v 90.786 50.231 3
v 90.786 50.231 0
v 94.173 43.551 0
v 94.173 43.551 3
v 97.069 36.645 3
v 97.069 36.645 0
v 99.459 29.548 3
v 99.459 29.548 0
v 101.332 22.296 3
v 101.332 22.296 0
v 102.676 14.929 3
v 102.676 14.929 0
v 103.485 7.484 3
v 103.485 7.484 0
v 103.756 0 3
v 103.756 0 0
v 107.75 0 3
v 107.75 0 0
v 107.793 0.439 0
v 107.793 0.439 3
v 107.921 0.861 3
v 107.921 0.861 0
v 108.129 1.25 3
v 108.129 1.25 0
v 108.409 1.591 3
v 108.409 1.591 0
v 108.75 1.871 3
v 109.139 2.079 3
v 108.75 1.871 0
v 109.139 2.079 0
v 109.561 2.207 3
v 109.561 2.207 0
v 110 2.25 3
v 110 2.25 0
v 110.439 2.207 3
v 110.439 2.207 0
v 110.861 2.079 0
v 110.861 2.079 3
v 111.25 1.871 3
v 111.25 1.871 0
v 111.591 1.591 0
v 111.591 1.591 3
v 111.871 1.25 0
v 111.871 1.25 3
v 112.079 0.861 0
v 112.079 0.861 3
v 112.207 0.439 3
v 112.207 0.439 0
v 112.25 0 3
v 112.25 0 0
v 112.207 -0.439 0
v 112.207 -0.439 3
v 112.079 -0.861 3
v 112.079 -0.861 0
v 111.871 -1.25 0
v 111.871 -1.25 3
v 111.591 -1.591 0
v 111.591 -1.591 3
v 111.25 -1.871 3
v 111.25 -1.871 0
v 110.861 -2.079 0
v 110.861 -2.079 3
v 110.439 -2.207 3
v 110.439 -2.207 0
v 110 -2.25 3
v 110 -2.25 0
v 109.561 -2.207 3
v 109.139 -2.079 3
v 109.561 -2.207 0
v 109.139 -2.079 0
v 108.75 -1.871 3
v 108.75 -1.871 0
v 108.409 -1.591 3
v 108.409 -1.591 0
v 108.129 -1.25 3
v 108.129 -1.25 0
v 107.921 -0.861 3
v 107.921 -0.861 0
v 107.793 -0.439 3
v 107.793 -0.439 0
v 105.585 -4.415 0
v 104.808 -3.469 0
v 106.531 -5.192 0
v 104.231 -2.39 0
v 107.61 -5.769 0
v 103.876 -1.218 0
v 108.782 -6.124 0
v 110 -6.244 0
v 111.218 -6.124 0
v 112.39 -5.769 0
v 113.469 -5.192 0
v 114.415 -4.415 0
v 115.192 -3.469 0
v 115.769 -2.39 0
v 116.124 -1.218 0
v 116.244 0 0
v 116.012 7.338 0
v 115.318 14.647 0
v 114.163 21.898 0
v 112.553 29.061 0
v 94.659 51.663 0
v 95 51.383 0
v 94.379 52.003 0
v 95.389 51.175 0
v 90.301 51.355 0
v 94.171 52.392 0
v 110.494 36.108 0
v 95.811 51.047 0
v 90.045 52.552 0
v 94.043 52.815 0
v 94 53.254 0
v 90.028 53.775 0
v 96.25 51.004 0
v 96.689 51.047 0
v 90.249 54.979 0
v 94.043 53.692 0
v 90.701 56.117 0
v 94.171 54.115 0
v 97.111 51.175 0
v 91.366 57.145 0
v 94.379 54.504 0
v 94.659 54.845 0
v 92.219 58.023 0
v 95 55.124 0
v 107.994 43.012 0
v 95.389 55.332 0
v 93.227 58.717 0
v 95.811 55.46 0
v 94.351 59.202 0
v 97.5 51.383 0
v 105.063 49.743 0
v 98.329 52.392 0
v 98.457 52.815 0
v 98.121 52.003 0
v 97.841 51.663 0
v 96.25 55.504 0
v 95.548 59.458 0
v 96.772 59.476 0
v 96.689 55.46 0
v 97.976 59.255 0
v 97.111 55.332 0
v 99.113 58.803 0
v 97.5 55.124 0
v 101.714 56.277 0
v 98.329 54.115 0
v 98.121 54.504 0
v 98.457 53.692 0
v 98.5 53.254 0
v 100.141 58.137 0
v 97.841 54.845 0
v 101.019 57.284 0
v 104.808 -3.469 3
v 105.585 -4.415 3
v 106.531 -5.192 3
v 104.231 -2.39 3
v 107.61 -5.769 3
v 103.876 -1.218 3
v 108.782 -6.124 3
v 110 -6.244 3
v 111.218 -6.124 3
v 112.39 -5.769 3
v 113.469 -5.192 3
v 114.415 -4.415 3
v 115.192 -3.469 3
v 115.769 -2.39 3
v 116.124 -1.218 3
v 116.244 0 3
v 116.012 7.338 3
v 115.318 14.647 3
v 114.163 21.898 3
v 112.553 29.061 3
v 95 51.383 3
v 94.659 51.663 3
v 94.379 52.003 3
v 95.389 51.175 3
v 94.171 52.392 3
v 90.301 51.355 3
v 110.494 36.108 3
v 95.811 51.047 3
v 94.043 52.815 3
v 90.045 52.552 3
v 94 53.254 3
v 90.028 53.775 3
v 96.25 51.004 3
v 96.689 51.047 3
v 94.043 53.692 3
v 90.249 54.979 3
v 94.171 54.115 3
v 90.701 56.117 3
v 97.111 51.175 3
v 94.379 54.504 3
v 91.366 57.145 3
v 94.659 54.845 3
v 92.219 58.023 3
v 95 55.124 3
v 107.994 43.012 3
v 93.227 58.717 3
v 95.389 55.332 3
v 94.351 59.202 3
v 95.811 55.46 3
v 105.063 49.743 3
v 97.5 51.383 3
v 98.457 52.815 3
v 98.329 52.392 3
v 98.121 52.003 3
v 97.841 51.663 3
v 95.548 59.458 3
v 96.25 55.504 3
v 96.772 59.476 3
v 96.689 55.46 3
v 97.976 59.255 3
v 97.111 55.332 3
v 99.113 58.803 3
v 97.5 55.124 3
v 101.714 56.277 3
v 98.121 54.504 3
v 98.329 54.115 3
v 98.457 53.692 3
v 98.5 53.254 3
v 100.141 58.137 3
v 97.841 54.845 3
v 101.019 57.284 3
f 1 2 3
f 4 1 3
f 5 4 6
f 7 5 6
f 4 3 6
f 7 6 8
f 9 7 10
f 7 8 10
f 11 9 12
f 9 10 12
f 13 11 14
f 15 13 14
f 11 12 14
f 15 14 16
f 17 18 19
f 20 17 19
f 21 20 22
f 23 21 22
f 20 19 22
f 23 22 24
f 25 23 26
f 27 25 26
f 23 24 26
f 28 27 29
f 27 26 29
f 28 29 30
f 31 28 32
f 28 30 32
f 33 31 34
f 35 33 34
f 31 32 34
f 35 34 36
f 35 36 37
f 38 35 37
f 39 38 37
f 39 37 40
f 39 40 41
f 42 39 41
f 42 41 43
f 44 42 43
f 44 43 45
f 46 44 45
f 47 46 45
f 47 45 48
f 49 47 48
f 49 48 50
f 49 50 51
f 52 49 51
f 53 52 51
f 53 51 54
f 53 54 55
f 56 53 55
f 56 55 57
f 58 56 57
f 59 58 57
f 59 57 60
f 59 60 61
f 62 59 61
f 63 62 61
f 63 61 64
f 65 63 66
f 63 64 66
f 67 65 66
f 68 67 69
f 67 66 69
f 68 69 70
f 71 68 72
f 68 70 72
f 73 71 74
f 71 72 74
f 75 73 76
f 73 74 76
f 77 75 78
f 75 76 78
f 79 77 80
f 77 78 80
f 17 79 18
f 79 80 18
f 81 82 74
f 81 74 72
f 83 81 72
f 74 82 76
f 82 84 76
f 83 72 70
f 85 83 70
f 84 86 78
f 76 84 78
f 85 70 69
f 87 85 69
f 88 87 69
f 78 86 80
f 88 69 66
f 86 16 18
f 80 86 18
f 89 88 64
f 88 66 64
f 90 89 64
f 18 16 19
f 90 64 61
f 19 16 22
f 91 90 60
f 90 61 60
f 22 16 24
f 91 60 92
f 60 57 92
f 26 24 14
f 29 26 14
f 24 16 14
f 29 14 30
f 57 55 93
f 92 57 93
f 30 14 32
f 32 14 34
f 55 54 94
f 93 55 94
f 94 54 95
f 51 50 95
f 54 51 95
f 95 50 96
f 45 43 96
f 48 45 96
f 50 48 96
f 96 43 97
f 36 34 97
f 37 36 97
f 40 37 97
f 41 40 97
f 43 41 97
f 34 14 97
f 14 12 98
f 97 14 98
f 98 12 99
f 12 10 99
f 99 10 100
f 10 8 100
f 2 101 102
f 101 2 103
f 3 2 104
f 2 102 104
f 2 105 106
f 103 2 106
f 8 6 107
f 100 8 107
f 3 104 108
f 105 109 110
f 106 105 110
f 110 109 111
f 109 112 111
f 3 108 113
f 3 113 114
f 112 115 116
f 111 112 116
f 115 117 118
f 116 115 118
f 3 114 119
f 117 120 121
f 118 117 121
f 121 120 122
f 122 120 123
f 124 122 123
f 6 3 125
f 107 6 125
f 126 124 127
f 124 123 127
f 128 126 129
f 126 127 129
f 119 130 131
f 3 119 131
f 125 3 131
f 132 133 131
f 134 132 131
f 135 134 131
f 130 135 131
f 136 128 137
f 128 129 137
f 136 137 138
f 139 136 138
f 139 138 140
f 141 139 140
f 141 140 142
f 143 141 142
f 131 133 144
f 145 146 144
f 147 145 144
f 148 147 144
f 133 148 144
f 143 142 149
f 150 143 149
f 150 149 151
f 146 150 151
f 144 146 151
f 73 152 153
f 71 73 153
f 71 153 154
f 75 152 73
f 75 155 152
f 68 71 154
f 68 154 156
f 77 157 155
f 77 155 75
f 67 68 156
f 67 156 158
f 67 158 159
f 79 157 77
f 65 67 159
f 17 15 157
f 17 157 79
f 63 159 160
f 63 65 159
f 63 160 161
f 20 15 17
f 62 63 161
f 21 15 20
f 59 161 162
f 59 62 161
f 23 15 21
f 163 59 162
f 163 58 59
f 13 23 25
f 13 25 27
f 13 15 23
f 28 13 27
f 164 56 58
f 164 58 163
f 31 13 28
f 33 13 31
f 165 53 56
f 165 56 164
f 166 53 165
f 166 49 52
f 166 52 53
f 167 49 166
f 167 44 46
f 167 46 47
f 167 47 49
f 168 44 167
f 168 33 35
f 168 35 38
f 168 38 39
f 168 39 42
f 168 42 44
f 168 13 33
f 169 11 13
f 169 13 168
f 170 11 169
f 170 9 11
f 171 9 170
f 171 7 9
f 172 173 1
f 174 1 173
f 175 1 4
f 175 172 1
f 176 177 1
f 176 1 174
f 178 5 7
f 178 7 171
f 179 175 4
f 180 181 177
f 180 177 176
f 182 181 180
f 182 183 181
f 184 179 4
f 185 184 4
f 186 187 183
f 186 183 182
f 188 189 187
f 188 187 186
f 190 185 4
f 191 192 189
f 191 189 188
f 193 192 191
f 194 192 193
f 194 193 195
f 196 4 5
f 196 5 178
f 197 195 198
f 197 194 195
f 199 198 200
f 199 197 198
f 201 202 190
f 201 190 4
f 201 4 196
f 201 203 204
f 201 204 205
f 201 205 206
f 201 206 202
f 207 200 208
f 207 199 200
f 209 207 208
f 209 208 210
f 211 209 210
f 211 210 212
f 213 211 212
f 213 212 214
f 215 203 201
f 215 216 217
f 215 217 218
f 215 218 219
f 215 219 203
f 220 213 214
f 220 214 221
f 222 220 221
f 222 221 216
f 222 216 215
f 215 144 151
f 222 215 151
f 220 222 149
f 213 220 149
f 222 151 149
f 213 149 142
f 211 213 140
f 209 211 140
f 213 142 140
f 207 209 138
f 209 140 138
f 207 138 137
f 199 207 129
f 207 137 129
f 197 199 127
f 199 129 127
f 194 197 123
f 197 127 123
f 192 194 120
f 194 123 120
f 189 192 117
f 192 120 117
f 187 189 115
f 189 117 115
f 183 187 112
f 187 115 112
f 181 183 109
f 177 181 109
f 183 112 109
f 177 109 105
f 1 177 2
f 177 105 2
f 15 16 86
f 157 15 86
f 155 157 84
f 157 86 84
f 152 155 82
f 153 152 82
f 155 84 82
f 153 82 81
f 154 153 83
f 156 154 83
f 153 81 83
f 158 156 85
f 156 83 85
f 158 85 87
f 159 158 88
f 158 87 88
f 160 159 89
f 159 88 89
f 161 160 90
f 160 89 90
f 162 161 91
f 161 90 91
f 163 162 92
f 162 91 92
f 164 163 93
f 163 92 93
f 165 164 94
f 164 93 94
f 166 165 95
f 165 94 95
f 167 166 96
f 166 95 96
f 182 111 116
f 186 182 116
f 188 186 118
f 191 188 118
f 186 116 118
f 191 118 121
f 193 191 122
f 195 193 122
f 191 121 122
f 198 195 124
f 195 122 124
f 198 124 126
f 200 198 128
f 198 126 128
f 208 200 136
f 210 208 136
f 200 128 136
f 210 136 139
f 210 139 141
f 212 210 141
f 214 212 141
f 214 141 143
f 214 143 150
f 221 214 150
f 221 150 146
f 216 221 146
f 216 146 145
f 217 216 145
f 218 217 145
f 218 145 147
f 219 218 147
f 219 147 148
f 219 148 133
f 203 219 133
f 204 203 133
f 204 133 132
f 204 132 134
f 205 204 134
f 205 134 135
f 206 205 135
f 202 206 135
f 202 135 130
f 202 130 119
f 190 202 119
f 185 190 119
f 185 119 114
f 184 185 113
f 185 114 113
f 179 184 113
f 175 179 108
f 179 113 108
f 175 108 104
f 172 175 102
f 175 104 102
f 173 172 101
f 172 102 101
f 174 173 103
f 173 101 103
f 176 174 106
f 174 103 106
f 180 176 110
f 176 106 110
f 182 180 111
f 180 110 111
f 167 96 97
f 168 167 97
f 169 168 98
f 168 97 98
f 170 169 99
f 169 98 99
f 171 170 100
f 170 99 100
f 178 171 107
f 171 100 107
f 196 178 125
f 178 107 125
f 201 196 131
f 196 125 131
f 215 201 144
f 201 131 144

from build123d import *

# Parameters (mm, degrees)
ESTRUSIONE_ESTRUSIONE1_DEPTH = 3
SCHIZZO2_R                   = 2.25
TAGLIO_ESTRUSIONE1_DEPTH     = 131.62050005


with BuildPart() as part:
    # Schizzo1 → Estrusione-Estrusione1 (new body)
    with BuildSketch(Plane.XY):
        with BuildLine():
            ThreePointArc((116.244263144, 0), (112.553023812, 29.061065786), (101.713730251, 56.276511906))
            ThreePointArc((101.713730251, 56.276511906), (93.227009104, 58.717251262), (90.786269749, 50.230530114))
            ThreePointArc((90.786269749, 50.230530114), (100.461060229, 25.938934214), (103.755736856, 0))
            ThreePointArc((103.755736856, 0), (110, -6.244263144), (116.244263144, 0))
        make_face()
    extrude(amount=ESTRUSIONE_ESTRUSIONE1_DEPTH)

    # Schizzo2 → Taglio-Estrusione1 (cut, through all)
    with BuildSketch(Plane(origin=(0, 0, 0), x_dir=(-1, 0, 0), z_dir=(0, 0, -1))):
        with Locations((-110, 0)):
            Circle(SCHIZZO2_R)
        with Locations((-96.25, 53.25352101)):
            Circle(SCHIZZO2_R)
    extrude(amount=-TAGLIO_ESTRUSIONE1_DEPTH, mode=Mode.SUBTRACT)


solid = part.part
